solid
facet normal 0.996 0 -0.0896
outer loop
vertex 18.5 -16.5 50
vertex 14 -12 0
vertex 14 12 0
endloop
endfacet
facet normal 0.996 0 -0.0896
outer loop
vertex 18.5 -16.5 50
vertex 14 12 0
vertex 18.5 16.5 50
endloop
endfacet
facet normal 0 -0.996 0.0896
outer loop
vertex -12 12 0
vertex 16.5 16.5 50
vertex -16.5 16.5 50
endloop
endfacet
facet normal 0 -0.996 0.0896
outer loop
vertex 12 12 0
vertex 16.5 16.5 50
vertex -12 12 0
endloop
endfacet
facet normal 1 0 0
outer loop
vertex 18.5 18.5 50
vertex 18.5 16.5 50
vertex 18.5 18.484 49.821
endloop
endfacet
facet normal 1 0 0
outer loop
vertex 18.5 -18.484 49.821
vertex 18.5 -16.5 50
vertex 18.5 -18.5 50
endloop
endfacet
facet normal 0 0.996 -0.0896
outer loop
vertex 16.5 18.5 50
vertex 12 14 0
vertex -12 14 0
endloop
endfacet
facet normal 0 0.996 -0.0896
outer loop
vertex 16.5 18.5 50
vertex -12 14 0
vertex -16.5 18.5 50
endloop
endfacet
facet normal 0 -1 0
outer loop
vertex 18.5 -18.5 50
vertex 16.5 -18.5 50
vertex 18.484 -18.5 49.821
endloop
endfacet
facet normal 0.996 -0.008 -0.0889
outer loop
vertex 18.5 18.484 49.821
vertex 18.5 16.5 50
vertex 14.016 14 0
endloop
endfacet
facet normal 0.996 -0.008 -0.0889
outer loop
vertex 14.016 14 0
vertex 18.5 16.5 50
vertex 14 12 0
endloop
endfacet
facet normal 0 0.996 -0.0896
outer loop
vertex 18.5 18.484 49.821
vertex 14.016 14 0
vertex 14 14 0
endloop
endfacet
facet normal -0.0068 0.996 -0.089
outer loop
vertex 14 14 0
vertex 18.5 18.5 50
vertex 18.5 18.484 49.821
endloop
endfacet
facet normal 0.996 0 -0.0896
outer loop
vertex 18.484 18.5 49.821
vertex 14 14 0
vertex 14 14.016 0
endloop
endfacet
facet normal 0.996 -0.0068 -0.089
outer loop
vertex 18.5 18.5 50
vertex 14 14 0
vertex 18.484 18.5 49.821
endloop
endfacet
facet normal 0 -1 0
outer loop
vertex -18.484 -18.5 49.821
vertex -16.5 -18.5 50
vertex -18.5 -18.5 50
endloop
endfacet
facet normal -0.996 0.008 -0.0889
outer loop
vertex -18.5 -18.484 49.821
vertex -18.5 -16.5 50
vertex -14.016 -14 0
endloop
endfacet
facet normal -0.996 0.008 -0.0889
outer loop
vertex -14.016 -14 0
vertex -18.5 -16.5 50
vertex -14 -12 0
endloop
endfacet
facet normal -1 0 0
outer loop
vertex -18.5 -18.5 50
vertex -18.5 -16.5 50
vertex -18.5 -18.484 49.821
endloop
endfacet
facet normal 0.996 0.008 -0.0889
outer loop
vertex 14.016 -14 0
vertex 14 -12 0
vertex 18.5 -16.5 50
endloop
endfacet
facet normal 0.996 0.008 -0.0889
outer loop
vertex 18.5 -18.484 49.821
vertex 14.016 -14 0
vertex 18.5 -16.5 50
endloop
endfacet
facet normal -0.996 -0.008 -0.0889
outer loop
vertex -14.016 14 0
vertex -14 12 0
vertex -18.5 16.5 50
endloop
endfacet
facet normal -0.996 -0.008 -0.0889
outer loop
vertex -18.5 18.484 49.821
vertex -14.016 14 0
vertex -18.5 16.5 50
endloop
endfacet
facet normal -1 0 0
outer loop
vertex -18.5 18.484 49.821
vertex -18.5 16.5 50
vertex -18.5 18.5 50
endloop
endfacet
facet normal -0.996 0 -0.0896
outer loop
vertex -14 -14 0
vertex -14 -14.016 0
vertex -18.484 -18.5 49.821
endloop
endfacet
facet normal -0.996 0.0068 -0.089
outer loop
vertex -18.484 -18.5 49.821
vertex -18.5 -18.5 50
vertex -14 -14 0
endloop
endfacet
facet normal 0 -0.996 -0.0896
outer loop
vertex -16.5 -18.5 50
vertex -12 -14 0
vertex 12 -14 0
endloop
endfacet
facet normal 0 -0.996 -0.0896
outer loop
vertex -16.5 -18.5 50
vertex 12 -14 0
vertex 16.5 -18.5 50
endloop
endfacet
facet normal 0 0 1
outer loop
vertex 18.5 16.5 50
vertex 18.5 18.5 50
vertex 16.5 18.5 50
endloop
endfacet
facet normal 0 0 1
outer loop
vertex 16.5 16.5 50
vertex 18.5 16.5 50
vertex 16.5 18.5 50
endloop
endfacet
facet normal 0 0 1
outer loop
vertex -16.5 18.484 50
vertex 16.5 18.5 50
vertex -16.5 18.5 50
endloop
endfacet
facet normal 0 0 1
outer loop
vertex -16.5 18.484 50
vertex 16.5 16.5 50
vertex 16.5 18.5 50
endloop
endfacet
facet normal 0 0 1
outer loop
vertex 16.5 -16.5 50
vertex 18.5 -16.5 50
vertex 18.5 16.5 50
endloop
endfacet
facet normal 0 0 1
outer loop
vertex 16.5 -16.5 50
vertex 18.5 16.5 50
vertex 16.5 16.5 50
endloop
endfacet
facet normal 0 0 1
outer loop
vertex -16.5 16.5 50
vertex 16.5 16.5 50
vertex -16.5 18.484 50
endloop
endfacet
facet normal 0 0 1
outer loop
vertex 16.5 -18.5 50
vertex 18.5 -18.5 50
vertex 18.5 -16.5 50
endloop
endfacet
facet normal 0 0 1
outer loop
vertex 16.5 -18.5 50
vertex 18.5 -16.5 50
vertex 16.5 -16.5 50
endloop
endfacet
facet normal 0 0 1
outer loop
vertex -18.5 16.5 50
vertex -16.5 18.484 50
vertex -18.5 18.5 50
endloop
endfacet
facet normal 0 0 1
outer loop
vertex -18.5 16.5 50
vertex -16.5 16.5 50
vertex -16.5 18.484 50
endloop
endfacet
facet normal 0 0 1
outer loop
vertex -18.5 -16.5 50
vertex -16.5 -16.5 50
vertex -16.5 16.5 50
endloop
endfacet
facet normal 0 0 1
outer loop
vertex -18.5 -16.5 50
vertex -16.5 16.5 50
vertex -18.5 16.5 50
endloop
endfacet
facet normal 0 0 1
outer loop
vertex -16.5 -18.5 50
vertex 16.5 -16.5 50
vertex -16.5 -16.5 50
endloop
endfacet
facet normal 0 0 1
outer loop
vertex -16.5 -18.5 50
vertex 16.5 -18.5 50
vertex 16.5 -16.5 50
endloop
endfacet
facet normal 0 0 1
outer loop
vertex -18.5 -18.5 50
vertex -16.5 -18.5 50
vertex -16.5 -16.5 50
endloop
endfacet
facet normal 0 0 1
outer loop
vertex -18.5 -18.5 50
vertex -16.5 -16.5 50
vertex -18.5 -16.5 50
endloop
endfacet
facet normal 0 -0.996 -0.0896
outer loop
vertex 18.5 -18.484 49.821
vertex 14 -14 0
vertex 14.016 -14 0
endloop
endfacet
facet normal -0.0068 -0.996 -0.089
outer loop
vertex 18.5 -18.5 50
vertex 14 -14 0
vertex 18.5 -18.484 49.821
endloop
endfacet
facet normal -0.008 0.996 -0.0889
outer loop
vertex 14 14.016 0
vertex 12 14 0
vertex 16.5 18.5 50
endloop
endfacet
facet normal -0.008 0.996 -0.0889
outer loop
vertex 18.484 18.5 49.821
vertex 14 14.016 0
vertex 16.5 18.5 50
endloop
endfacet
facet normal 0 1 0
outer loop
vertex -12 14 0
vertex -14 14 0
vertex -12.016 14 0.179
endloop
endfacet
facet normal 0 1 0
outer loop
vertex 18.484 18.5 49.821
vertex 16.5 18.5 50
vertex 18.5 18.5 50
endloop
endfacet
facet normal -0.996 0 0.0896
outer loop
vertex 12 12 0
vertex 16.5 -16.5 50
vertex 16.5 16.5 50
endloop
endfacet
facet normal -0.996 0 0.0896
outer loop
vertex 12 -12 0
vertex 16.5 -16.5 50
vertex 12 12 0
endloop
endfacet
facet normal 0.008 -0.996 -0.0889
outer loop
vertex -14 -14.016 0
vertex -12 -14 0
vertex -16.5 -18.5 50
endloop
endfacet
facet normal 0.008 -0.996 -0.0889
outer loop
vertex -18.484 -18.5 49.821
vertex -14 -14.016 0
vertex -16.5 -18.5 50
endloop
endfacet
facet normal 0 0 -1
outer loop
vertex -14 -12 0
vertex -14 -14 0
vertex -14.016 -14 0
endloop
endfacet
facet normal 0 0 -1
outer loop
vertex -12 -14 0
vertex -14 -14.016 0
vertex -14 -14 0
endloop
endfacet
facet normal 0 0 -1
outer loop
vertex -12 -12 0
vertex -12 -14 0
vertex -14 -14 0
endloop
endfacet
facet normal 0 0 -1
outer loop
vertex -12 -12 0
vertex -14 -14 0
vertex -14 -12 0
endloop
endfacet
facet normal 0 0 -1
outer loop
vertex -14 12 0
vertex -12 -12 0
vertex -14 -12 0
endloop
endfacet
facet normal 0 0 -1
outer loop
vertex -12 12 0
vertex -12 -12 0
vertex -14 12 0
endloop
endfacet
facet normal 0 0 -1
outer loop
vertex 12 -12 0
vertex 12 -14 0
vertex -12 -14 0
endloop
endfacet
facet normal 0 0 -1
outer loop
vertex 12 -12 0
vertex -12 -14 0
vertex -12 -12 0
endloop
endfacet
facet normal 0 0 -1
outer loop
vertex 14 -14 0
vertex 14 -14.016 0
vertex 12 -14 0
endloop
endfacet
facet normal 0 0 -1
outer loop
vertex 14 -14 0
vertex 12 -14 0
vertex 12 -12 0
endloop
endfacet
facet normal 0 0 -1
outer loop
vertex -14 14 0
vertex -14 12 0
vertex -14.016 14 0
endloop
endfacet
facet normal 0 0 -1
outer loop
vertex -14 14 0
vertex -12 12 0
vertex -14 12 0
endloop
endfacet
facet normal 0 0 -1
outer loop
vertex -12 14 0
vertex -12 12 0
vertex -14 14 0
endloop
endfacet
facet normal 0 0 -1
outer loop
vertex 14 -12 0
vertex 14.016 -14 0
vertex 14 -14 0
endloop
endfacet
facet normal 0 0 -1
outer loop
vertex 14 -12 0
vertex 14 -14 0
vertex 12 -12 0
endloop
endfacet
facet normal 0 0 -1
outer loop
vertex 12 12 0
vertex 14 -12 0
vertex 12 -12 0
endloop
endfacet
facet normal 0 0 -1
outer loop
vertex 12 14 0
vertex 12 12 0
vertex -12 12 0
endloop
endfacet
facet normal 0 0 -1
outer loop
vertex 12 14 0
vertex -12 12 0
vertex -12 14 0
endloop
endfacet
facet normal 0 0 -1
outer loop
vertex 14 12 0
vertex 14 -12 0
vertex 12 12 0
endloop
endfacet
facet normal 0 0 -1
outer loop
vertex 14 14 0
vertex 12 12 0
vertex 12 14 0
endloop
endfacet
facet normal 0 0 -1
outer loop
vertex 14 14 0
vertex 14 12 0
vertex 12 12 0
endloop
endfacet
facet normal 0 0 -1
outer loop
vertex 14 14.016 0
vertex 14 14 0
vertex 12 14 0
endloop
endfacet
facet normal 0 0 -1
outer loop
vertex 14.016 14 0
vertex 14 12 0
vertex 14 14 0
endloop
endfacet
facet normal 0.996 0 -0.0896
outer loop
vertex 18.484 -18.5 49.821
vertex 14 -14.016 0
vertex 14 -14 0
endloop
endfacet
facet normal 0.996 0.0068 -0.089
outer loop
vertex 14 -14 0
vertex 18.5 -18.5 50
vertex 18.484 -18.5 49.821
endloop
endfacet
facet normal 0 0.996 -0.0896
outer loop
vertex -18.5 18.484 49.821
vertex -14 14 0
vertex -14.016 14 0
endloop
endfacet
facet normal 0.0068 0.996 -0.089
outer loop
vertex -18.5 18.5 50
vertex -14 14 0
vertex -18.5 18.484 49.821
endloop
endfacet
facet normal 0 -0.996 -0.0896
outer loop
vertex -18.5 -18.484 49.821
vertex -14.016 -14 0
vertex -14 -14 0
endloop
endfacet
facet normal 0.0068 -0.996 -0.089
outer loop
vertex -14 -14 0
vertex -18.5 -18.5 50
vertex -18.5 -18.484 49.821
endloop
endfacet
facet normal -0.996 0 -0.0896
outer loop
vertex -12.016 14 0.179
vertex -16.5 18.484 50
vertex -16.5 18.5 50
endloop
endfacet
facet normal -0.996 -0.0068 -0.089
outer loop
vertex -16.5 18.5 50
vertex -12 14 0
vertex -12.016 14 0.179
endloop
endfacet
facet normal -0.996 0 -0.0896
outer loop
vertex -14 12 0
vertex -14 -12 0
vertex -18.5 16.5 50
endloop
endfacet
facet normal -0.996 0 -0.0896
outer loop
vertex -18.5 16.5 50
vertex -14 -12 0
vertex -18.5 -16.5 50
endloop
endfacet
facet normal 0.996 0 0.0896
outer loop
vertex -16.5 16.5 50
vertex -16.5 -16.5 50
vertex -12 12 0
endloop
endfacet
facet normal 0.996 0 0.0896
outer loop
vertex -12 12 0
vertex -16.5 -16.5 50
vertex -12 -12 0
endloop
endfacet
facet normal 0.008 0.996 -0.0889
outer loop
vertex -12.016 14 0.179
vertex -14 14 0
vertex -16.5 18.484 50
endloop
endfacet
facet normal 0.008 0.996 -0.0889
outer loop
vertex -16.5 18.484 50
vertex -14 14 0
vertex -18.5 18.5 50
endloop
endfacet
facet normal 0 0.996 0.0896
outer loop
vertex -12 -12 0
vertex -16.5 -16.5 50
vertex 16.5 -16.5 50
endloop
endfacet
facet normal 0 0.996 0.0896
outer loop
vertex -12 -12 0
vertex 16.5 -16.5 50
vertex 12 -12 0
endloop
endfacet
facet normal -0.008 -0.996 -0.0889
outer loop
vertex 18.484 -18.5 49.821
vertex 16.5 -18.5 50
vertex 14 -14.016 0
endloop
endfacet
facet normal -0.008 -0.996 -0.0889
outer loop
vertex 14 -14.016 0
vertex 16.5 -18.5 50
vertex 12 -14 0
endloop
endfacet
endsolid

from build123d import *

# Parameters (mm, degrees)
PAD_DEPTH          = 18.5
PAD_DEPTH_BACK     = 18.5
POLARPATTERN_COUNT = 4
POCKET_DEPTH       = 6.4748338525
POCKET001_DEPTH    = 6.4748338525
POCKET002_DEPTH    = 1.9919488777
POCKET003_DEPTH    = 5
POCKET004_DEPTH    = 5
POCKET005_DEPTH    = 5
POCKET006_DEPTH    = 5
POCKET007_DEPTH    = 5
POCKET008_DEPTH    = 5


with BuildPart() as part:
    # Sketch → Pad (new body, two sides)
    with BuildSketch(Plane.XZ) as pad_sk:
        Polygon((-16.5, 50), (-12, 0), (-14, 0), (-18.5, 50), align=None)
    pad = extrude(amount=PAD_DEPTH) + extrude(pad_sk.sketch, amount=-PAD_DEPTH_BACK)

    # PolarPattern: Pad ×4 about axis
    polarpattern_axis = Axis((0, 0, 0), (0, 0, 1))
    for i in range(1, POLARPATTERN_COUNT):
        add(pad.rotate(polarpattern_axis, i * 360 / POLARPATTERN_COUNT))

    # PolarPattern Face15 → Pocket (cut, through all)
    with BuildSketch(Plane(origin=(-13.5, -17, 16.6666666667), x_dir=(0, -1, 0), z_dir=(0.9959744388, 0, 0.0896376995))):
        Polygon((-3, 16.73403053), (1.5, -33.4680610599), (1.5, 16.73403053), align=None)
    extrude(amount=-POCKET_DEPTH, mode=Mode.SUBTRACT)

    # Pocket Face11 → Pocket001 (cut, through all)
    with BuildSketch(Plane(origin=(-17, -13.5, 16.6666666667), x_dir=(1, 0, 0), z_dir=(0, 0.9959744388, 0.0896376995))):
        Polygon((-1.5, 16.73403053), (-1.5, -33.4680610599), (3, 16.73403053), align=None)
    extrude(amount=-POCKET001_DEPTH, mode=Mode.SUBTRACT)

    # Pocket001 Face4 → Pocket002 (cut)
    with BuildSketch(Plane(origin=(-15.5, 17, 16.6666666667), x_dir=(0, 1, 0), z_dir=(-0.9959744388, 0, -0.0896376995))):
        Polygon((1.5, -33.4680610599), (1.5, 16.73403053), (-3, 16.73403053), align=None)
    extrude(amount=-POCKET002_DEPTH, mode=Mode.SUBTRACT)

    # Pocket002 Face9 → Pocket003 (cut)
    with BuildSketch(Plane(origin=(-17, 13.5, 16.6666666667), x_dir=(-1, 0, 0), z_dir=(0, -0.9959744388, 0.0896376995))):
        Polygon((-3, 16.73403053), (1.5, -33.4680610599), (1.5, 16.73403053), align=None)
    extrude(amount=-POCKET003_DEPTH, mode=Mode.SUBTRACT)

    # Pocket003 Face15 → Pocket004 (cut)
    with BuildSketch(Plane(origin=(13.5, -17, 16.6666666667), x_dir=(0, 1, 0), z_dir=(-0.9959744388, 0, 0.0896376995))):
        Polygon((-1.5, 16.73403053), (-1.5, -33.4680610599), (3, 16.73403053), align=None)
    extrude(amount=-POCKET004_DEPTH, mode=Mode.SUBTRACT)

    # Pocket004 Face26 → Pocket005 (cut)
    with BuildSketch(Plane(origin=(13.5, 17, 16.6666666667), x_dir=(0, 1, 0), z_dir=(-0.9959744388, 0, 0.0896376995))):
        Polygon((-3, 16.73403053), (1.5, -33.4680610599), (1.5, 16.73403053), align=None)
    extrude(amount=-POCKET005_DEPTH, mode=Mode.SUBTRACT)

    # Pocket005 Face21 → Pocket006 (cut)
    with BuildSketch(Plane(origin=(17, 13.5, 16.6666666667), x_dir=(-1, 0, 0), z_dir=(0, -0.9959744388, 0.0896376995))):
        Polygon((-1.5, 16.73403053), (-1.5, -33.4680610599), (3, 16.73403053), align=None)
    extrude(amount=-POCKET006_DEPTH, mode=Mode.SUBTRACT)

    # Pocket006 Face19 → Pocket007 (cut)
    with BuildSketch(Plane(origin=(17, -13.5, 16.6666666667), x_dir=(1, 0, 0), z_dir=(0, 0.9959744388, 0.0896376995))):
        Polygon((-3, 16.73403053), (1.5, -33.4680610599), (1.5, 16.73403053), align=None)
    extrude(amount=-POCKET007_DEPTH, mode=Mode.SUBTRACT)

    # Pocket007 Face2 → Pocket008 (cut)
    with BuildSketch(Plane(origin=(-13.0080349172, 16.25, 0.0892768575), x_dir=(0, 1, 0), z_dir=(-0.0896376995, 0, 0.9959744388))):
        Polygon((2.25, 0.9959744388), (-2.25, 0.9959744388), (-2.25, -0.9959744388), (-2.2339301657, -0.9959744388), (2.25, -0.9959744388), align=None)
    extrude(amount=-POCKET008_DEPTH, mode=Mode.SUBTRACT)


solid = part.part
